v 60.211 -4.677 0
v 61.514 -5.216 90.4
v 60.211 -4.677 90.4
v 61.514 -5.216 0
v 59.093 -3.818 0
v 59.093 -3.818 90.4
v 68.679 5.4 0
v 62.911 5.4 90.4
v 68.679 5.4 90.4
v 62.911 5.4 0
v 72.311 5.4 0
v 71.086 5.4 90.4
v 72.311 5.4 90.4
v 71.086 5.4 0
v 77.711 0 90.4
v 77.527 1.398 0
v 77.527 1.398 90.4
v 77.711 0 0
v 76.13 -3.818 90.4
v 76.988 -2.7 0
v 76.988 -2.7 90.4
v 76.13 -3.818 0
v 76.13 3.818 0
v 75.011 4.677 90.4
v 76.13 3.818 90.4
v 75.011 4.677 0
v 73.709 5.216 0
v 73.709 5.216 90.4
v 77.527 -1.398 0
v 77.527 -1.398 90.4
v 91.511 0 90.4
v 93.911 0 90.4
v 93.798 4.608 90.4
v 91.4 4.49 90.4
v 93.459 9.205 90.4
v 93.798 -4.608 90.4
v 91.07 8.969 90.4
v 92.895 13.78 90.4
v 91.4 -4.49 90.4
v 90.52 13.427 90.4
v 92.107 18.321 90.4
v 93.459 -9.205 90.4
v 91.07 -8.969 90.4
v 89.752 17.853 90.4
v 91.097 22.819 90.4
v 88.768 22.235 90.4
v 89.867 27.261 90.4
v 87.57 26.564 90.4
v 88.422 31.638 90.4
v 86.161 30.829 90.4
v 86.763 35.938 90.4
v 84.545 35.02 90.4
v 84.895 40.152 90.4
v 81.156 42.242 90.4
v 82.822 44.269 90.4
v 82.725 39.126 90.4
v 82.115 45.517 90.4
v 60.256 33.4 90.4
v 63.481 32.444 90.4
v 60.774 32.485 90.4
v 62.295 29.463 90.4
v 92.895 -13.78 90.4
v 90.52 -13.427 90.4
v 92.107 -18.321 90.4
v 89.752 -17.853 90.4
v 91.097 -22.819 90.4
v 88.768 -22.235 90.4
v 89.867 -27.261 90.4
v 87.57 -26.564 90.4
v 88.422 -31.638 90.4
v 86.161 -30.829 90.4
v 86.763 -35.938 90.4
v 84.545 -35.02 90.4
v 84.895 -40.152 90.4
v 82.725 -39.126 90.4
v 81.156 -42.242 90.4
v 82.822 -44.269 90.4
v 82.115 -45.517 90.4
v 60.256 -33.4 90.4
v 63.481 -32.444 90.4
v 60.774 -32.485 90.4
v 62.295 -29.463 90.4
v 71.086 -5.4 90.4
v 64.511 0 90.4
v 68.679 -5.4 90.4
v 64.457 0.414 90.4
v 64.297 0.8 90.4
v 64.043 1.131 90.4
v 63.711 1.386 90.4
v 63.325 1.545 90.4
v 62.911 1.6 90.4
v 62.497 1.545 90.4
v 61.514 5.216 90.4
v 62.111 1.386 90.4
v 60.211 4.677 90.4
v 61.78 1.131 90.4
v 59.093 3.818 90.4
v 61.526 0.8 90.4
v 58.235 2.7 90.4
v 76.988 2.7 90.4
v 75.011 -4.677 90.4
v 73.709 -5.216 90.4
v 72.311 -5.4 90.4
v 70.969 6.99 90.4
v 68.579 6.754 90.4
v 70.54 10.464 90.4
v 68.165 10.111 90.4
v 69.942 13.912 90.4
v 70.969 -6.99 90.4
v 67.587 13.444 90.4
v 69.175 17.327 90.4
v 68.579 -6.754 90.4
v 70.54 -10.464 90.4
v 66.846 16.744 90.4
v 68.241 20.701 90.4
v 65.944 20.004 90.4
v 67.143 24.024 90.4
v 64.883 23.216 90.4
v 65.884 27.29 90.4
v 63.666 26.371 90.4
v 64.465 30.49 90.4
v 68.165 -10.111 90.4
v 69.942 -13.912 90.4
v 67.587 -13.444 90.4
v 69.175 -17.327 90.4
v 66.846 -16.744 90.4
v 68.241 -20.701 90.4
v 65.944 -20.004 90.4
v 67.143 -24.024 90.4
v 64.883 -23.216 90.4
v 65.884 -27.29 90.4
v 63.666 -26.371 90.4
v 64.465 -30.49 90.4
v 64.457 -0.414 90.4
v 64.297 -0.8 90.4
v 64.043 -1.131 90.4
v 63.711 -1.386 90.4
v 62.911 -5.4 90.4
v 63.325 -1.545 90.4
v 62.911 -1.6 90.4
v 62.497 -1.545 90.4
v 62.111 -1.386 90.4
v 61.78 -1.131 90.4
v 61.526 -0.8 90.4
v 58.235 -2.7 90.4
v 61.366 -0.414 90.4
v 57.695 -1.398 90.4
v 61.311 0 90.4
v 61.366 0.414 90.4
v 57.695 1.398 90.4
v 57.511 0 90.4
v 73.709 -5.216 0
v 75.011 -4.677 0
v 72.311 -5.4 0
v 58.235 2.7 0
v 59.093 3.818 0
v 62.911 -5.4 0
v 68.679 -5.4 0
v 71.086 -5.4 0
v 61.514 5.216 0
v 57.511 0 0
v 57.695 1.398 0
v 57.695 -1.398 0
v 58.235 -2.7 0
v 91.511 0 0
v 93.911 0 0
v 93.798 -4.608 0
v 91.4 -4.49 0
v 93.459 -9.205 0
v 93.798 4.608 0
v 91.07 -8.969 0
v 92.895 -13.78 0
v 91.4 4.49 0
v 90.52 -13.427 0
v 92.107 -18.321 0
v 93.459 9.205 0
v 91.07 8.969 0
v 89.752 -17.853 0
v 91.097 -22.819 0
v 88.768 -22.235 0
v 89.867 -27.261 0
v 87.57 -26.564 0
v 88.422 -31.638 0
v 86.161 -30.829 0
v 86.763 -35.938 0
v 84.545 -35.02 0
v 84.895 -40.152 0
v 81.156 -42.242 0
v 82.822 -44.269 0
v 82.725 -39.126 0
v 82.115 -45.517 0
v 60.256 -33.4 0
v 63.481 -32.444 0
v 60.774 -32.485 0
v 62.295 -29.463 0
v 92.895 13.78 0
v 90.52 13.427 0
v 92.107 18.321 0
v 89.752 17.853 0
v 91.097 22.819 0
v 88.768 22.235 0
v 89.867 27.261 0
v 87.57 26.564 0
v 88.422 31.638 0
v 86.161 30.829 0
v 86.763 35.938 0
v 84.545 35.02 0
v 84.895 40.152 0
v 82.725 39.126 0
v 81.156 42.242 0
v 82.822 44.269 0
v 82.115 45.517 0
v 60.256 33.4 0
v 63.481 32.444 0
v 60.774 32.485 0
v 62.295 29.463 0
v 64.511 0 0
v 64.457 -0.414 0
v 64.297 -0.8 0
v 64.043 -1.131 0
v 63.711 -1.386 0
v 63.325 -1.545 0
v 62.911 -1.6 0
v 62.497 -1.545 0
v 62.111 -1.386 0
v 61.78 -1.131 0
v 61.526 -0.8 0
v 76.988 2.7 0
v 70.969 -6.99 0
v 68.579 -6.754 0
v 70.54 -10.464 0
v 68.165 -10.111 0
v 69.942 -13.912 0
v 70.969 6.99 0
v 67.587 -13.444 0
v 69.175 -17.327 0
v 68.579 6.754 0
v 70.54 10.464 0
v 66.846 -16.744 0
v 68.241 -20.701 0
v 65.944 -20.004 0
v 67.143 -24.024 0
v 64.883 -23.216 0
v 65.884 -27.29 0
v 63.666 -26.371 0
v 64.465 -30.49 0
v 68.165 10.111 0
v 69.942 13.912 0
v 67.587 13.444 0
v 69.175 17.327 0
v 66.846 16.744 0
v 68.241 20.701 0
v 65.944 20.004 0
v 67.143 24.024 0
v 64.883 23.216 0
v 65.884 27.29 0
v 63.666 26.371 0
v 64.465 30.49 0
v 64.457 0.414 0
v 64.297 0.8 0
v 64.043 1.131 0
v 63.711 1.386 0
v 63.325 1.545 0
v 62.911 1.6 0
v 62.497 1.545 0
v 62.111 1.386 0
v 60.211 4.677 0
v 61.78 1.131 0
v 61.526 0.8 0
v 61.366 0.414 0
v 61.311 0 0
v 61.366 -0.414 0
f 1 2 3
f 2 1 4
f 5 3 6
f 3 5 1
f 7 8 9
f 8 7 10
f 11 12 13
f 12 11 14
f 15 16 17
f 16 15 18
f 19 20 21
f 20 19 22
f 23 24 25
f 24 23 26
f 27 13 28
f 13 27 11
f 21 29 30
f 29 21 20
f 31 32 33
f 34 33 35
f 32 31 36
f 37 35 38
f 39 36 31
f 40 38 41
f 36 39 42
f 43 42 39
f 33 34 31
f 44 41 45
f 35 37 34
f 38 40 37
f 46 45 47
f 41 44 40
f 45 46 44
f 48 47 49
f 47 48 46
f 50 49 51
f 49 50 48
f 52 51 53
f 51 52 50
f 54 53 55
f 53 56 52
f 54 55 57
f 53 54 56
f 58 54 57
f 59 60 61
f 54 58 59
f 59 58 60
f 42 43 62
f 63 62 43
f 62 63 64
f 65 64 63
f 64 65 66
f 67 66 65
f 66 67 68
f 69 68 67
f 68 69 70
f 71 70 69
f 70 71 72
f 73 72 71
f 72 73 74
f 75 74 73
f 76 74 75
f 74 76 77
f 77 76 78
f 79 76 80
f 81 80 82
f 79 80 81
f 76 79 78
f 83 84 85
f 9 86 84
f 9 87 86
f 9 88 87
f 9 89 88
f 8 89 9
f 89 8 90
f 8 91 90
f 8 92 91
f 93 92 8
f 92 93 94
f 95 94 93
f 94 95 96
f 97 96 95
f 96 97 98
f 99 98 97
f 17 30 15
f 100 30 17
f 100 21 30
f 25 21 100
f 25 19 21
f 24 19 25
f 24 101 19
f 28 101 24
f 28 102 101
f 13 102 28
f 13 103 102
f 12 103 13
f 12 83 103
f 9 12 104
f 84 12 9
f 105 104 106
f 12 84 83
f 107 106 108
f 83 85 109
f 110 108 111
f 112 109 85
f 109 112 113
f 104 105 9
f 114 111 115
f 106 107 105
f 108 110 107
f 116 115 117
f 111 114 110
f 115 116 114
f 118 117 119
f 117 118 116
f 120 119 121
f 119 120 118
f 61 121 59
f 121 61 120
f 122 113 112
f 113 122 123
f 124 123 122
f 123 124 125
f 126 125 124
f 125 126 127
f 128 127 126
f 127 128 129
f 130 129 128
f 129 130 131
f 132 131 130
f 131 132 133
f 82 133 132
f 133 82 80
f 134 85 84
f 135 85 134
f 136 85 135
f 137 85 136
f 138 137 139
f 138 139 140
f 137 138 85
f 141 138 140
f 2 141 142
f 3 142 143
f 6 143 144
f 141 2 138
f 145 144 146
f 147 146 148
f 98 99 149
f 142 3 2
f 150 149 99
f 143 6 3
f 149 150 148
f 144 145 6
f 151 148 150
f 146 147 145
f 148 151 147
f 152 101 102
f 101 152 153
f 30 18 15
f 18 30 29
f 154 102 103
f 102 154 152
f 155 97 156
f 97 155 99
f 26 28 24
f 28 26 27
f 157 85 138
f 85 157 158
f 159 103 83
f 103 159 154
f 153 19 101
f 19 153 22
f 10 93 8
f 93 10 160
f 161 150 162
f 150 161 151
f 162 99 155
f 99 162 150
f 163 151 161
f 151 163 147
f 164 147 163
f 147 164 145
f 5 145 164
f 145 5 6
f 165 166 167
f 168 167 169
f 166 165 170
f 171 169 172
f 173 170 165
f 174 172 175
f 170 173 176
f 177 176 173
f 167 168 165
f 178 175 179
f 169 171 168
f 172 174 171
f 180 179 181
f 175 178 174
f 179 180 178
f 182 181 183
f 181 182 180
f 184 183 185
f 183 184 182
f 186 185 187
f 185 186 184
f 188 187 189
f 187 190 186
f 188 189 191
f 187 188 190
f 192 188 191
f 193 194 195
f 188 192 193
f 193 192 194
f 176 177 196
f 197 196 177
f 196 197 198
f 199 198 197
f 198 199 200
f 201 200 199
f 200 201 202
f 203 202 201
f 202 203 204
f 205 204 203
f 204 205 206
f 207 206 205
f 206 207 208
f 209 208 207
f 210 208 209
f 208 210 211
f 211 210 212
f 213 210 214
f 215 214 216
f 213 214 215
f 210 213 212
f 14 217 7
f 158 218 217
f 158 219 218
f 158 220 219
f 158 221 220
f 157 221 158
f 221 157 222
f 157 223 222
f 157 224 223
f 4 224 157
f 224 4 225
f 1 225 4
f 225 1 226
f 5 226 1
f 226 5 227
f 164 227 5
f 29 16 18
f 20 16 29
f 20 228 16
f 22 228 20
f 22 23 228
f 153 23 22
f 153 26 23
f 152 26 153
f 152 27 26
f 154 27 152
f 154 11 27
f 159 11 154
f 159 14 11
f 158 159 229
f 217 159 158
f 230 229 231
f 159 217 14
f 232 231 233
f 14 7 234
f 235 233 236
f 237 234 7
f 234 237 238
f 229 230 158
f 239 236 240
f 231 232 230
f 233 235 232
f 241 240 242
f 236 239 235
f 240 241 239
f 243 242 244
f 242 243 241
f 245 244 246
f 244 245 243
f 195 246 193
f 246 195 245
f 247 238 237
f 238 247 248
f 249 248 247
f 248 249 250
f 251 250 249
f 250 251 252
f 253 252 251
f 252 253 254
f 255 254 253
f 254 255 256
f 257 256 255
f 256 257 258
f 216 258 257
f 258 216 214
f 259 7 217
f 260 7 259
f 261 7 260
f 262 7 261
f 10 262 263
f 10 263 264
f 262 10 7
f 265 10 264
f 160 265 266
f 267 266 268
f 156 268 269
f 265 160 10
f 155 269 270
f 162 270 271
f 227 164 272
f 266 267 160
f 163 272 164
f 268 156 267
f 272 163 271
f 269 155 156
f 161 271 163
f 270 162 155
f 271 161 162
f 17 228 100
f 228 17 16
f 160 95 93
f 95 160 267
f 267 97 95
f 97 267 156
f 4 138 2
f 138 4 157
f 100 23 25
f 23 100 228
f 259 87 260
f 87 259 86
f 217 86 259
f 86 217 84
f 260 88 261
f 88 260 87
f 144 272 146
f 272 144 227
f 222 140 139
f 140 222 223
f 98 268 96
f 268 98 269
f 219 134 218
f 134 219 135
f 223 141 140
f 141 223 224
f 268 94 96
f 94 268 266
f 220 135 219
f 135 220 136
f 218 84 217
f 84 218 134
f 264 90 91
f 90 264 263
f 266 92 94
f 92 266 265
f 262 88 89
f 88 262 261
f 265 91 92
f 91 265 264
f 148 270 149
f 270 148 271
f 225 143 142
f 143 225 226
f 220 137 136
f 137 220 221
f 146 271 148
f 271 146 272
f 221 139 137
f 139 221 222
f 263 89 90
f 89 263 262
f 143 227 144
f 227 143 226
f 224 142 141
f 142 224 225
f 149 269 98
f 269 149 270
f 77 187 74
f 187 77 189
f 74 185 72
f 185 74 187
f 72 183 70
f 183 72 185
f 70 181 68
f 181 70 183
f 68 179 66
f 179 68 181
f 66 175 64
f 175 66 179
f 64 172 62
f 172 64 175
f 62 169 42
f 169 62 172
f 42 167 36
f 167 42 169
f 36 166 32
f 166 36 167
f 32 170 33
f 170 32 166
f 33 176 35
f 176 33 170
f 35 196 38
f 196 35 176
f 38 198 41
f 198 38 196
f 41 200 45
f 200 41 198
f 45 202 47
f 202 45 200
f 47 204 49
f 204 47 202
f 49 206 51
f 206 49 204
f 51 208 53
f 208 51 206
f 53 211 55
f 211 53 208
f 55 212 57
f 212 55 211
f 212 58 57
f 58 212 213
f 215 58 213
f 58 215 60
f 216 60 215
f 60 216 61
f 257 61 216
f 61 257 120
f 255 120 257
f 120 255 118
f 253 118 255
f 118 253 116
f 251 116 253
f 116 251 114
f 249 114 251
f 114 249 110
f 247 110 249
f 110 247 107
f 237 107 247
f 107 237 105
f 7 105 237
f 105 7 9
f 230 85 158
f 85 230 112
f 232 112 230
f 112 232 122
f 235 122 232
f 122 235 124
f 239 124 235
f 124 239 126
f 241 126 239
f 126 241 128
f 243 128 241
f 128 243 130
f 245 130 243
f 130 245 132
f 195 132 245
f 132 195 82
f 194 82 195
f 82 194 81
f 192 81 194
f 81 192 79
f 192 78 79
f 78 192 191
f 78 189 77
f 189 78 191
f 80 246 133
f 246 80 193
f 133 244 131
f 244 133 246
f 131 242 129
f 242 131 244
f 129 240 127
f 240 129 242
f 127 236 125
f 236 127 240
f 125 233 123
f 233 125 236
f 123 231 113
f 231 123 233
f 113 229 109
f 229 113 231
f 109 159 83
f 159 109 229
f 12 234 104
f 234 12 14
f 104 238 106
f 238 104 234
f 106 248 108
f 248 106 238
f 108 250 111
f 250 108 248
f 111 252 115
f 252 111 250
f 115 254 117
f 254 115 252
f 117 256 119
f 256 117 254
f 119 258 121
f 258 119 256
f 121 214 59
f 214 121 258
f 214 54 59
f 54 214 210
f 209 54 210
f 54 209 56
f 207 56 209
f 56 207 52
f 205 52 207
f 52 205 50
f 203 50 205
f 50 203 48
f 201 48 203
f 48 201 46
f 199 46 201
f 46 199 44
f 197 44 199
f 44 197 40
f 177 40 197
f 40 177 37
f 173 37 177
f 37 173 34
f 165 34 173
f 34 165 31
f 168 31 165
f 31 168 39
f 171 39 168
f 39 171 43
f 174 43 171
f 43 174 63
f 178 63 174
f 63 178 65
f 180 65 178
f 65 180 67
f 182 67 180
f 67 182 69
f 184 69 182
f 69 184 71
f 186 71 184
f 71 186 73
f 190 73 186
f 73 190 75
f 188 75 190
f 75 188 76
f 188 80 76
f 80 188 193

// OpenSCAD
// file: helpers.scad
// Shared 2D helpers used by wedge.scad, base.scad and lid.scad.

// Big half-plane (y >= 0), used to build angle masks. `big` just has to be
// larger than any radius used in the design.
module halfplane(big = 2000) {
    translate([-big/2, 0]) square([big, big]);
}

// An angular mask covering [-a/2, +a/2], built as the intersection of two
// half-planes rather than an origin-apex polygon: a sector polygon with its
// point pinned exactly at (0,0) tends to produce a self-touching ("bowtie")
// result once differenced against a same-apex sector for the inner radius,
// which extrudes into a non-manifold solid. Two rotated half-planes never
// share that degenerate vertex.
module angle_mask(a) {
    intersection() {
        rotate([0, 0, -a/2]) halfplane();
        rotate([0, 0, a/2 - 180]) halfplane();
    }
}

// A ring slice between radius r1 and r2, angular width a, centered on angle 0.
module ring_slice(r1, r2, a) {
    intersection() {
        difference() {
            circle(r = r2, $fn = 128);
            circle(r = r1, $fn = 128);
        }
        angle_mask(a);
    }
}
// file: params.scad
// Shared parameters for the whole dispenser — edit these once, every part
// (hub, wedges, base, lid) picks them up via `include`.
// Measure your own packs before printing: hard packs vary a few mm by brand.

slots      = 6;     // number of pockets around the carousel
pack_w     = 55;    // pack width (mm)  - sits tangentially (packs stand upright)
pack_d     = 22;    // pack depth (mm)  - sits radially
pack_h     = 85;    // pack height (mm) - packs stand upright in the pocket
clear      = 3;     // per-side clearance around a pack
wall       = 2.4;   // wall thickness (~6 perimeters at 0.4mm nozzle, PETG)

gap_deg    = 2;                     // angular gap left between neighboring wedges
ang        = 360/slots - gap_deg;   // usable angle per wedge

hub_margin = 6;      // extra radius beyond the strict minimum (wall + boss room)

// r_in is derived, not hand-picked: the tangential width available at r_in
// for one wedge (a chord of angle `ang`) must be >= pack_w + 2*clear, or the
// pack won't fit — sizing this by hand for hub.scad, wedge.scad and base.scad
// separately caused pockets narrower than the pack in an earlier revision.
r_in       = (pack_w + 2*clear) / (2*sin(ang/2)) + hub_margin;
r_out      = r_in + pack_d + clear;

hub_od     = 2 * (r_in - 2);  // hub sits just inside r_in
hub_id     = 8;               // bore for the motor shaft coupler (mm)
hub_height = pack_h + clear + wall;

boss_d     = 6;      // hub attachment boss diameter
boss_hole  = 3.2;    // clearance hole for M3 screw
// main file
// Pocket wedge — print `slots` copies (see params.scad), one per pocket.
// Each wedge is an open-top, open-bottom tube: the STATIONARY base plate
// (base.scad) is what actually holds the packs up. Only where the base has
// its chute cutout does a pocket's bottom open up, so a pack drops out
// exactly when the carousel rotates that pocket over the chute.
include <params.scad>
include <helpers.scad>

tab_r = hub_od/2 - boss_d/2 - 1;  // must match the boss position in hub.scad

// Screw tab, connected to the wedge's inner wall by a hull() bridge so it's
// always one solid part regardless of the gap between tab_r and r_in.
module tab() {
    difference() {
        hull() {
            translate([tab_r, 0, 0])
                cylinder(d = boss_d + wall*2, h = hub_height, $fn = 24);
            // reach past r_in into the ring's solid wall (r_in .. r_in+wall)
            // so the hull actually overlaps solid material, not the hollow
            // pocket interior — a 1mm-short bridge left a manifold gap here.
            translate([r_in + wall + 1, 0, 0])
                cylinder(d = boss_d + wall*2, h = hub_height, $fn = 24);
        }
        translate([tab_r, 0, -1])
            cylinder(d = boss_hole, h = hub_height + 2, $fn = 24);
    }
}

module wedge() {
    union() {
        linear_extrude(height = hub_height)
            difference() {
                ring_slice(r_in, r_out, ang);
                offset(delta = -wall) ring_slice(r_in, r_out, ang);
            }
        tab();
    }
}

wedge();
